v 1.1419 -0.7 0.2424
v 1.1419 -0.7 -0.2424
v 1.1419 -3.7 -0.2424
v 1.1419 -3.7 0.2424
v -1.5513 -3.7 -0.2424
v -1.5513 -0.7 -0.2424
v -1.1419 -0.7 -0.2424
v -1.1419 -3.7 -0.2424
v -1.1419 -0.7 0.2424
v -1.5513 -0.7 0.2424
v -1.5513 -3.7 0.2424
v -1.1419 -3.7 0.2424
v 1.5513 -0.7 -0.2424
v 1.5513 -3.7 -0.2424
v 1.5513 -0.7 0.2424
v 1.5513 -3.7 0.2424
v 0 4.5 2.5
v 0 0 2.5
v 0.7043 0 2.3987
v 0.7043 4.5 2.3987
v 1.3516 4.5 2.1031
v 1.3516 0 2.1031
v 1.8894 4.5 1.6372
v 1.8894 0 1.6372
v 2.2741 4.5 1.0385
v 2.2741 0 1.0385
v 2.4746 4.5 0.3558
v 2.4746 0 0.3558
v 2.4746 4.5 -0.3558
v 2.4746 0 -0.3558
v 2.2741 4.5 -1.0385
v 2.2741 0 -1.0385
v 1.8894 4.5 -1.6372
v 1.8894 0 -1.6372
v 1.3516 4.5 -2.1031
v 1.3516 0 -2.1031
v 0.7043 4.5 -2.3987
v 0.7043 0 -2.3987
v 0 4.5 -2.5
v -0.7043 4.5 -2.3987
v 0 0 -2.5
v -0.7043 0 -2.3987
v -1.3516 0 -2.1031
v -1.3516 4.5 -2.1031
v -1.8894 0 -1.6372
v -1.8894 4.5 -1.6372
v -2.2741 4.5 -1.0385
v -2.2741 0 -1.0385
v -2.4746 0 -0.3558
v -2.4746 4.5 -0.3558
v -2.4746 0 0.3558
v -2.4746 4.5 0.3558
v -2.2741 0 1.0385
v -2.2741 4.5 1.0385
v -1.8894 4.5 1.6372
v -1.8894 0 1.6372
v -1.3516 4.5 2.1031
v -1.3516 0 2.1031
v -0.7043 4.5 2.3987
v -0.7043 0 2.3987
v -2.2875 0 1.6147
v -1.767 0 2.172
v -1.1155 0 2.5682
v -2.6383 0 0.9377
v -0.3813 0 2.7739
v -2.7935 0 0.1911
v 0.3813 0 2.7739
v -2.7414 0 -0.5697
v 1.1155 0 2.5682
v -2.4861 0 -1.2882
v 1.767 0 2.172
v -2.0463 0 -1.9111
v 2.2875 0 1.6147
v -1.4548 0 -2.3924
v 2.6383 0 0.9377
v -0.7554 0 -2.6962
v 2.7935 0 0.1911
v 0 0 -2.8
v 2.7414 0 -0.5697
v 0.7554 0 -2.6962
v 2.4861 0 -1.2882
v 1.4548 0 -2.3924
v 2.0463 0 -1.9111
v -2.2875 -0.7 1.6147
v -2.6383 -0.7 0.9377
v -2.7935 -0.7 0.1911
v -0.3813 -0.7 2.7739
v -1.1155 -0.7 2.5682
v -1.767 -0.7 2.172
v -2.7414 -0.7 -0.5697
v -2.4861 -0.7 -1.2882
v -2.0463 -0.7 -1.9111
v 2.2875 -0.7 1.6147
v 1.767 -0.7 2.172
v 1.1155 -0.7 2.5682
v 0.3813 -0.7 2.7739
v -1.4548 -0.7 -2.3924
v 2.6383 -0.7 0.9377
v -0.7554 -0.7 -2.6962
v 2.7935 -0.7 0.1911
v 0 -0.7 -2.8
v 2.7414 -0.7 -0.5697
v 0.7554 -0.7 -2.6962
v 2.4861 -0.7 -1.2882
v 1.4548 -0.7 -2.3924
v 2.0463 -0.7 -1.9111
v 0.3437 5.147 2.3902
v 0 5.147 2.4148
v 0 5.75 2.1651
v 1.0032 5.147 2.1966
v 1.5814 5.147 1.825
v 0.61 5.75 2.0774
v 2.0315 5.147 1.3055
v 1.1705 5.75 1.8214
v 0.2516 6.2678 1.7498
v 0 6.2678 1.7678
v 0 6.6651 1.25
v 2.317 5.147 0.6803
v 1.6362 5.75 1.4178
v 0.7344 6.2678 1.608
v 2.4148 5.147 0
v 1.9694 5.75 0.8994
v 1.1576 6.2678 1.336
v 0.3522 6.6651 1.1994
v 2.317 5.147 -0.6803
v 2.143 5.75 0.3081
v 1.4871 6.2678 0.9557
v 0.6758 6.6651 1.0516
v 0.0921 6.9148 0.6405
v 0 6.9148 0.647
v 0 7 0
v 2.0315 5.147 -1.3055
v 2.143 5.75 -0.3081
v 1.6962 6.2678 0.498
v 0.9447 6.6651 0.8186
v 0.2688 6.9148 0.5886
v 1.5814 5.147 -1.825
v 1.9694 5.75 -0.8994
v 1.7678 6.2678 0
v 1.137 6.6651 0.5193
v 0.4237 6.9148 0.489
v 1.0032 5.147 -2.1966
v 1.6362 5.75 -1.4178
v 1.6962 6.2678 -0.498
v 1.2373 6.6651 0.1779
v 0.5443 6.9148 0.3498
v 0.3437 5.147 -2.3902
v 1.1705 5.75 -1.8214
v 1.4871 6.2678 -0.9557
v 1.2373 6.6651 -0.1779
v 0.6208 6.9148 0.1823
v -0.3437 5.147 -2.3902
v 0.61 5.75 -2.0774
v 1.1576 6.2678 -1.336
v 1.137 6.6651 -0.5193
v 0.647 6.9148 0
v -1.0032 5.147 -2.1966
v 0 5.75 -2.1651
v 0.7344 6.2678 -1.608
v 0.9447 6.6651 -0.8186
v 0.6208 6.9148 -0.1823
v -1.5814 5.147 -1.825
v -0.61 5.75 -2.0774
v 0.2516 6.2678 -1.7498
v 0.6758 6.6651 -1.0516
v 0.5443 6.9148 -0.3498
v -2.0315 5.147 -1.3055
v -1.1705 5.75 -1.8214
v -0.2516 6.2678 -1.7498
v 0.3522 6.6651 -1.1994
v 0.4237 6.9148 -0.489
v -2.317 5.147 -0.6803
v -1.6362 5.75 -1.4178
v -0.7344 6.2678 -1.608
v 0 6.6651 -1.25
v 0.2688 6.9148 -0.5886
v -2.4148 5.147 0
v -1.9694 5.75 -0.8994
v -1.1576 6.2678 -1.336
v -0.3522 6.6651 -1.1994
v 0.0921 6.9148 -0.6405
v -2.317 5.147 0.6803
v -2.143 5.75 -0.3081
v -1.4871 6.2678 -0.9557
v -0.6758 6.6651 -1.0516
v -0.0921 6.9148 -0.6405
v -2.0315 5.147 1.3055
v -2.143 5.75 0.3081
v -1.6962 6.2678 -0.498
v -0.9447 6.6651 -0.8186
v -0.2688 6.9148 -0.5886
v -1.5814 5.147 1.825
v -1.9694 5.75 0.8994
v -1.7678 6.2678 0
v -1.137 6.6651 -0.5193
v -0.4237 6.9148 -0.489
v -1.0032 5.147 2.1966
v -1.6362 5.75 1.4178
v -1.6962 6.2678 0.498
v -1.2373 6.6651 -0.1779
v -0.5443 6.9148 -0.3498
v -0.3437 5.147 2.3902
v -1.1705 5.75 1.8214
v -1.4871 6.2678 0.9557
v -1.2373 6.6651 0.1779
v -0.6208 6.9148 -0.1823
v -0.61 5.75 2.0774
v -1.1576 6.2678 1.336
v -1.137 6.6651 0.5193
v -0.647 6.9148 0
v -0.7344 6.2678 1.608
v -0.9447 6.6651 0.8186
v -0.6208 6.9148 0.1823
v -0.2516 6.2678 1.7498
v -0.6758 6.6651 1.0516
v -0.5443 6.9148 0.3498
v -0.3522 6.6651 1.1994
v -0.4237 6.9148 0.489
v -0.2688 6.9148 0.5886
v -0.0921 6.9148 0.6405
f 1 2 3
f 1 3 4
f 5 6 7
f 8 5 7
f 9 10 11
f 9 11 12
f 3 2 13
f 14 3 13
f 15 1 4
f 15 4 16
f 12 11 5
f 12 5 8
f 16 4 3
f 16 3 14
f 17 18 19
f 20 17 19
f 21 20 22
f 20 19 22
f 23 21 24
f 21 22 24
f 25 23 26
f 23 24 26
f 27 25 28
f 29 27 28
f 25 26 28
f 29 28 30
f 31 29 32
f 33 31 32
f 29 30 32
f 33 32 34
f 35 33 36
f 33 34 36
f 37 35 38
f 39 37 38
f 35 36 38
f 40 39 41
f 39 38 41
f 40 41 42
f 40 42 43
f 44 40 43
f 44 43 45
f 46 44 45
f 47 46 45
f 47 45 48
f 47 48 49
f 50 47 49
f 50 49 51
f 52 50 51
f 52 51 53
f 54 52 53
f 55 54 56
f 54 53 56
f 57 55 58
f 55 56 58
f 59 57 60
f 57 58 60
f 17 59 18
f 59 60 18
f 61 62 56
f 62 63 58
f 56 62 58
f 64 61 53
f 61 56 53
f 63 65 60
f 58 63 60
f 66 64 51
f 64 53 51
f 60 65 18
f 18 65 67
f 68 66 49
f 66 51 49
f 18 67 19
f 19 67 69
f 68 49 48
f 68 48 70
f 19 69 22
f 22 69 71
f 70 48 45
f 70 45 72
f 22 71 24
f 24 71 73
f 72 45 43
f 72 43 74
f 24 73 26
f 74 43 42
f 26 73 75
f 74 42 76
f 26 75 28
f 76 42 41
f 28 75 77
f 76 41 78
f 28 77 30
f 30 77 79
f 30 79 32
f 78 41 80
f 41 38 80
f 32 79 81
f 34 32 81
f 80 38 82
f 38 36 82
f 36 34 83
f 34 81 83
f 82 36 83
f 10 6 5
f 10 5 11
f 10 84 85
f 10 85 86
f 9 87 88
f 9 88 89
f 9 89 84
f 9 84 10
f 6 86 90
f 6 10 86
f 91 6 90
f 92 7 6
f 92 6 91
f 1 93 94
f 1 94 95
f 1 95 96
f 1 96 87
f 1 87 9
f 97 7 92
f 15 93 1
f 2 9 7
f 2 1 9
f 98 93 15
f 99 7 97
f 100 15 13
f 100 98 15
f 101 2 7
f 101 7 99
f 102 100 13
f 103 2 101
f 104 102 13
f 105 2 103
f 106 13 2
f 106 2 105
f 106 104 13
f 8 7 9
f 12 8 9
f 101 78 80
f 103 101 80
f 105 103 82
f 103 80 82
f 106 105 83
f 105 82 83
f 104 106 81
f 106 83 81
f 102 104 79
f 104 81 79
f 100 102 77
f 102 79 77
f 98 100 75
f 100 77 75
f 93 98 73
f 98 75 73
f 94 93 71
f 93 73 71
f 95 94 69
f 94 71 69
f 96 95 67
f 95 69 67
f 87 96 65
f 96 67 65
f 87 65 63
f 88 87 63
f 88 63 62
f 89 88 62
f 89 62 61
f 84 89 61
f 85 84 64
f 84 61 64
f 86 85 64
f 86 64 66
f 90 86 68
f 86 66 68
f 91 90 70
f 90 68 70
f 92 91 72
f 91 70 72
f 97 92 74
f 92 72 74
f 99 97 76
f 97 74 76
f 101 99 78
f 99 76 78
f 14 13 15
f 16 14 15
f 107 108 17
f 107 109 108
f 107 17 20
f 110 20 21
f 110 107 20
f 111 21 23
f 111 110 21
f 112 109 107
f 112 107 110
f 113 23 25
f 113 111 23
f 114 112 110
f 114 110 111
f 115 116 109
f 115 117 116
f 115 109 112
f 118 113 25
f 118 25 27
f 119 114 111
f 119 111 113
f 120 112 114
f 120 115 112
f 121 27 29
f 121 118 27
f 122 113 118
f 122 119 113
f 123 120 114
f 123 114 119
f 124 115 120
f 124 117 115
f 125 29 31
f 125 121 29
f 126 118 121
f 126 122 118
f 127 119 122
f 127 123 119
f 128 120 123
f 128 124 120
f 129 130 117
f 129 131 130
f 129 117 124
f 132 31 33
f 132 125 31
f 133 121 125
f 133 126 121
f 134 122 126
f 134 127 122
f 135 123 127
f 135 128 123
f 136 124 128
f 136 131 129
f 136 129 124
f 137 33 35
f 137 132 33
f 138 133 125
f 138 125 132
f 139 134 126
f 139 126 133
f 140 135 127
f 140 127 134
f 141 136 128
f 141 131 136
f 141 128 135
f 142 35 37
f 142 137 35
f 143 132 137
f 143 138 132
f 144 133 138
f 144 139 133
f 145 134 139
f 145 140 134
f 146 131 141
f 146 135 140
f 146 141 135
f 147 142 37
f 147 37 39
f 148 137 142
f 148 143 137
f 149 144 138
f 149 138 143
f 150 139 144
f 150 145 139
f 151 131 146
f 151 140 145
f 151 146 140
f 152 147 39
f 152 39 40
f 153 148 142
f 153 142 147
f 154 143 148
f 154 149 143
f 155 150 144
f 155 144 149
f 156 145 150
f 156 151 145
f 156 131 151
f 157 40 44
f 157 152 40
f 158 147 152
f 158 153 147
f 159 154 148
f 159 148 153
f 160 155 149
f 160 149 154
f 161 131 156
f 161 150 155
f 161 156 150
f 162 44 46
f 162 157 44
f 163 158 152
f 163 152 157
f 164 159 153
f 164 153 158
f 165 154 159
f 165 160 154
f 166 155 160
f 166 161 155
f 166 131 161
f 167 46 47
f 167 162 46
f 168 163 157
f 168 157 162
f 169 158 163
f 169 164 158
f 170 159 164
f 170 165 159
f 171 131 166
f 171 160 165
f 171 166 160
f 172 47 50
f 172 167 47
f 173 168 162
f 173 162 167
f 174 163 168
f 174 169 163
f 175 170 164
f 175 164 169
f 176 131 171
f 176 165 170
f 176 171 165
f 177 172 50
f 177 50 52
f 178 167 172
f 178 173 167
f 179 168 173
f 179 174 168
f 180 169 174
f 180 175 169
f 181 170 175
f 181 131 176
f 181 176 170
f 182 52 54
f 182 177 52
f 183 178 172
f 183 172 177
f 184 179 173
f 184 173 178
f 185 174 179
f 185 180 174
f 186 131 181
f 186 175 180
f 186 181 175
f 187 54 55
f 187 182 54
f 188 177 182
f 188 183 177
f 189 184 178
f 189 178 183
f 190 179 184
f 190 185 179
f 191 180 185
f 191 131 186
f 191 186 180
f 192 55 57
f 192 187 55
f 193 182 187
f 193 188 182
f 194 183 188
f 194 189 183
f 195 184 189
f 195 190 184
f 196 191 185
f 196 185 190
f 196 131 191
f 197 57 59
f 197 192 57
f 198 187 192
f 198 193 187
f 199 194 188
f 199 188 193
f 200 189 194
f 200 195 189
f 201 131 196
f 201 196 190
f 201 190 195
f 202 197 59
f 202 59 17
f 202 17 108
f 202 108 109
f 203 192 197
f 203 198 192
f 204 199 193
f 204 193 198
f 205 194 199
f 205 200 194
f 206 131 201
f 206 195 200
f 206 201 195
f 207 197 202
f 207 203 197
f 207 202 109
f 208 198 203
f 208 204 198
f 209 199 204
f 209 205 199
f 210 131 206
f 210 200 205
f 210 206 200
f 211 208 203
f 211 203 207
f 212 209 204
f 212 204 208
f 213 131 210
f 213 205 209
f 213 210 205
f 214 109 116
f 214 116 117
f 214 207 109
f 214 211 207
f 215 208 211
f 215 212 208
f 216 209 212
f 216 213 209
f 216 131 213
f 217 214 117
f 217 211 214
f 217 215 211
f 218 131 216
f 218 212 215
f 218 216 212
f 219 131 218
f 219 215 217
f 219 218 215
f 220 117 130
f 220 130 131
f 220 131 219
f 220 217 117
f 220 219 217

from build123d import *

# Parameters (mm, degrees)
SKETCH2_R           = 2.5
BOSS_EXTRUDE1_DEPTH = 7
SKETCH3_R           = 2.8
BOSS_EXTRUDE2_DEPTH = 0.7
FILLET1_R           = 2.5
SKETCH4_W           = 0.409361502
SKETCH4_H           = 0.4847702
BOSS_EXTRUDE3_DEPTH = 3


with BuildPart() as part:
    # Sketch2 → Boss-Extrude1 (new body)
    with BuildSketch(Plane(origin=(0, 0, 0), x_dir=(1, 0, 0), z_dir=(0, 1, 0))):
        with Locations(Location((0, 0, 0), (0, 0, 270))):
            Circle(SKETCH2_R)
    extrude(amount=BOSS_EXTRUDE1_DEPTH)

    # Sketch3 → Boss-Extrude2 (add)
    with BuildSketch(Plane.XZ):
        with Locations(Location((0, 0, 0), (0, 0, 270))):
            Circle(SKETCH3_R)
    extrude(amount=BOSS_EXTRUDE2_DEPTH)

    # Fillet1
    fillet1_edges = [part.edges().sort_by_distance(p)[0] for p in [
        (0, 7, -2.5),
    ]]
    fillet(fillet1_edges, radius=FILLET1_R)

    # Sketch4 → Boss-Extrude3 (add)
    with BuildSketch(Plane.XZ.offset(0.7)):
        with Locations((1.346583888, 0)):
            Rectangle(SKETCH4_W, SKETCH4_H)
        with Locations((-1.346583888, 0)):
            Rectangle(SKETCH4_W, SKETCH4_H)
    extrude(amount=BOSS_EXTRUDE3_DEPTH)


solid = part.part
